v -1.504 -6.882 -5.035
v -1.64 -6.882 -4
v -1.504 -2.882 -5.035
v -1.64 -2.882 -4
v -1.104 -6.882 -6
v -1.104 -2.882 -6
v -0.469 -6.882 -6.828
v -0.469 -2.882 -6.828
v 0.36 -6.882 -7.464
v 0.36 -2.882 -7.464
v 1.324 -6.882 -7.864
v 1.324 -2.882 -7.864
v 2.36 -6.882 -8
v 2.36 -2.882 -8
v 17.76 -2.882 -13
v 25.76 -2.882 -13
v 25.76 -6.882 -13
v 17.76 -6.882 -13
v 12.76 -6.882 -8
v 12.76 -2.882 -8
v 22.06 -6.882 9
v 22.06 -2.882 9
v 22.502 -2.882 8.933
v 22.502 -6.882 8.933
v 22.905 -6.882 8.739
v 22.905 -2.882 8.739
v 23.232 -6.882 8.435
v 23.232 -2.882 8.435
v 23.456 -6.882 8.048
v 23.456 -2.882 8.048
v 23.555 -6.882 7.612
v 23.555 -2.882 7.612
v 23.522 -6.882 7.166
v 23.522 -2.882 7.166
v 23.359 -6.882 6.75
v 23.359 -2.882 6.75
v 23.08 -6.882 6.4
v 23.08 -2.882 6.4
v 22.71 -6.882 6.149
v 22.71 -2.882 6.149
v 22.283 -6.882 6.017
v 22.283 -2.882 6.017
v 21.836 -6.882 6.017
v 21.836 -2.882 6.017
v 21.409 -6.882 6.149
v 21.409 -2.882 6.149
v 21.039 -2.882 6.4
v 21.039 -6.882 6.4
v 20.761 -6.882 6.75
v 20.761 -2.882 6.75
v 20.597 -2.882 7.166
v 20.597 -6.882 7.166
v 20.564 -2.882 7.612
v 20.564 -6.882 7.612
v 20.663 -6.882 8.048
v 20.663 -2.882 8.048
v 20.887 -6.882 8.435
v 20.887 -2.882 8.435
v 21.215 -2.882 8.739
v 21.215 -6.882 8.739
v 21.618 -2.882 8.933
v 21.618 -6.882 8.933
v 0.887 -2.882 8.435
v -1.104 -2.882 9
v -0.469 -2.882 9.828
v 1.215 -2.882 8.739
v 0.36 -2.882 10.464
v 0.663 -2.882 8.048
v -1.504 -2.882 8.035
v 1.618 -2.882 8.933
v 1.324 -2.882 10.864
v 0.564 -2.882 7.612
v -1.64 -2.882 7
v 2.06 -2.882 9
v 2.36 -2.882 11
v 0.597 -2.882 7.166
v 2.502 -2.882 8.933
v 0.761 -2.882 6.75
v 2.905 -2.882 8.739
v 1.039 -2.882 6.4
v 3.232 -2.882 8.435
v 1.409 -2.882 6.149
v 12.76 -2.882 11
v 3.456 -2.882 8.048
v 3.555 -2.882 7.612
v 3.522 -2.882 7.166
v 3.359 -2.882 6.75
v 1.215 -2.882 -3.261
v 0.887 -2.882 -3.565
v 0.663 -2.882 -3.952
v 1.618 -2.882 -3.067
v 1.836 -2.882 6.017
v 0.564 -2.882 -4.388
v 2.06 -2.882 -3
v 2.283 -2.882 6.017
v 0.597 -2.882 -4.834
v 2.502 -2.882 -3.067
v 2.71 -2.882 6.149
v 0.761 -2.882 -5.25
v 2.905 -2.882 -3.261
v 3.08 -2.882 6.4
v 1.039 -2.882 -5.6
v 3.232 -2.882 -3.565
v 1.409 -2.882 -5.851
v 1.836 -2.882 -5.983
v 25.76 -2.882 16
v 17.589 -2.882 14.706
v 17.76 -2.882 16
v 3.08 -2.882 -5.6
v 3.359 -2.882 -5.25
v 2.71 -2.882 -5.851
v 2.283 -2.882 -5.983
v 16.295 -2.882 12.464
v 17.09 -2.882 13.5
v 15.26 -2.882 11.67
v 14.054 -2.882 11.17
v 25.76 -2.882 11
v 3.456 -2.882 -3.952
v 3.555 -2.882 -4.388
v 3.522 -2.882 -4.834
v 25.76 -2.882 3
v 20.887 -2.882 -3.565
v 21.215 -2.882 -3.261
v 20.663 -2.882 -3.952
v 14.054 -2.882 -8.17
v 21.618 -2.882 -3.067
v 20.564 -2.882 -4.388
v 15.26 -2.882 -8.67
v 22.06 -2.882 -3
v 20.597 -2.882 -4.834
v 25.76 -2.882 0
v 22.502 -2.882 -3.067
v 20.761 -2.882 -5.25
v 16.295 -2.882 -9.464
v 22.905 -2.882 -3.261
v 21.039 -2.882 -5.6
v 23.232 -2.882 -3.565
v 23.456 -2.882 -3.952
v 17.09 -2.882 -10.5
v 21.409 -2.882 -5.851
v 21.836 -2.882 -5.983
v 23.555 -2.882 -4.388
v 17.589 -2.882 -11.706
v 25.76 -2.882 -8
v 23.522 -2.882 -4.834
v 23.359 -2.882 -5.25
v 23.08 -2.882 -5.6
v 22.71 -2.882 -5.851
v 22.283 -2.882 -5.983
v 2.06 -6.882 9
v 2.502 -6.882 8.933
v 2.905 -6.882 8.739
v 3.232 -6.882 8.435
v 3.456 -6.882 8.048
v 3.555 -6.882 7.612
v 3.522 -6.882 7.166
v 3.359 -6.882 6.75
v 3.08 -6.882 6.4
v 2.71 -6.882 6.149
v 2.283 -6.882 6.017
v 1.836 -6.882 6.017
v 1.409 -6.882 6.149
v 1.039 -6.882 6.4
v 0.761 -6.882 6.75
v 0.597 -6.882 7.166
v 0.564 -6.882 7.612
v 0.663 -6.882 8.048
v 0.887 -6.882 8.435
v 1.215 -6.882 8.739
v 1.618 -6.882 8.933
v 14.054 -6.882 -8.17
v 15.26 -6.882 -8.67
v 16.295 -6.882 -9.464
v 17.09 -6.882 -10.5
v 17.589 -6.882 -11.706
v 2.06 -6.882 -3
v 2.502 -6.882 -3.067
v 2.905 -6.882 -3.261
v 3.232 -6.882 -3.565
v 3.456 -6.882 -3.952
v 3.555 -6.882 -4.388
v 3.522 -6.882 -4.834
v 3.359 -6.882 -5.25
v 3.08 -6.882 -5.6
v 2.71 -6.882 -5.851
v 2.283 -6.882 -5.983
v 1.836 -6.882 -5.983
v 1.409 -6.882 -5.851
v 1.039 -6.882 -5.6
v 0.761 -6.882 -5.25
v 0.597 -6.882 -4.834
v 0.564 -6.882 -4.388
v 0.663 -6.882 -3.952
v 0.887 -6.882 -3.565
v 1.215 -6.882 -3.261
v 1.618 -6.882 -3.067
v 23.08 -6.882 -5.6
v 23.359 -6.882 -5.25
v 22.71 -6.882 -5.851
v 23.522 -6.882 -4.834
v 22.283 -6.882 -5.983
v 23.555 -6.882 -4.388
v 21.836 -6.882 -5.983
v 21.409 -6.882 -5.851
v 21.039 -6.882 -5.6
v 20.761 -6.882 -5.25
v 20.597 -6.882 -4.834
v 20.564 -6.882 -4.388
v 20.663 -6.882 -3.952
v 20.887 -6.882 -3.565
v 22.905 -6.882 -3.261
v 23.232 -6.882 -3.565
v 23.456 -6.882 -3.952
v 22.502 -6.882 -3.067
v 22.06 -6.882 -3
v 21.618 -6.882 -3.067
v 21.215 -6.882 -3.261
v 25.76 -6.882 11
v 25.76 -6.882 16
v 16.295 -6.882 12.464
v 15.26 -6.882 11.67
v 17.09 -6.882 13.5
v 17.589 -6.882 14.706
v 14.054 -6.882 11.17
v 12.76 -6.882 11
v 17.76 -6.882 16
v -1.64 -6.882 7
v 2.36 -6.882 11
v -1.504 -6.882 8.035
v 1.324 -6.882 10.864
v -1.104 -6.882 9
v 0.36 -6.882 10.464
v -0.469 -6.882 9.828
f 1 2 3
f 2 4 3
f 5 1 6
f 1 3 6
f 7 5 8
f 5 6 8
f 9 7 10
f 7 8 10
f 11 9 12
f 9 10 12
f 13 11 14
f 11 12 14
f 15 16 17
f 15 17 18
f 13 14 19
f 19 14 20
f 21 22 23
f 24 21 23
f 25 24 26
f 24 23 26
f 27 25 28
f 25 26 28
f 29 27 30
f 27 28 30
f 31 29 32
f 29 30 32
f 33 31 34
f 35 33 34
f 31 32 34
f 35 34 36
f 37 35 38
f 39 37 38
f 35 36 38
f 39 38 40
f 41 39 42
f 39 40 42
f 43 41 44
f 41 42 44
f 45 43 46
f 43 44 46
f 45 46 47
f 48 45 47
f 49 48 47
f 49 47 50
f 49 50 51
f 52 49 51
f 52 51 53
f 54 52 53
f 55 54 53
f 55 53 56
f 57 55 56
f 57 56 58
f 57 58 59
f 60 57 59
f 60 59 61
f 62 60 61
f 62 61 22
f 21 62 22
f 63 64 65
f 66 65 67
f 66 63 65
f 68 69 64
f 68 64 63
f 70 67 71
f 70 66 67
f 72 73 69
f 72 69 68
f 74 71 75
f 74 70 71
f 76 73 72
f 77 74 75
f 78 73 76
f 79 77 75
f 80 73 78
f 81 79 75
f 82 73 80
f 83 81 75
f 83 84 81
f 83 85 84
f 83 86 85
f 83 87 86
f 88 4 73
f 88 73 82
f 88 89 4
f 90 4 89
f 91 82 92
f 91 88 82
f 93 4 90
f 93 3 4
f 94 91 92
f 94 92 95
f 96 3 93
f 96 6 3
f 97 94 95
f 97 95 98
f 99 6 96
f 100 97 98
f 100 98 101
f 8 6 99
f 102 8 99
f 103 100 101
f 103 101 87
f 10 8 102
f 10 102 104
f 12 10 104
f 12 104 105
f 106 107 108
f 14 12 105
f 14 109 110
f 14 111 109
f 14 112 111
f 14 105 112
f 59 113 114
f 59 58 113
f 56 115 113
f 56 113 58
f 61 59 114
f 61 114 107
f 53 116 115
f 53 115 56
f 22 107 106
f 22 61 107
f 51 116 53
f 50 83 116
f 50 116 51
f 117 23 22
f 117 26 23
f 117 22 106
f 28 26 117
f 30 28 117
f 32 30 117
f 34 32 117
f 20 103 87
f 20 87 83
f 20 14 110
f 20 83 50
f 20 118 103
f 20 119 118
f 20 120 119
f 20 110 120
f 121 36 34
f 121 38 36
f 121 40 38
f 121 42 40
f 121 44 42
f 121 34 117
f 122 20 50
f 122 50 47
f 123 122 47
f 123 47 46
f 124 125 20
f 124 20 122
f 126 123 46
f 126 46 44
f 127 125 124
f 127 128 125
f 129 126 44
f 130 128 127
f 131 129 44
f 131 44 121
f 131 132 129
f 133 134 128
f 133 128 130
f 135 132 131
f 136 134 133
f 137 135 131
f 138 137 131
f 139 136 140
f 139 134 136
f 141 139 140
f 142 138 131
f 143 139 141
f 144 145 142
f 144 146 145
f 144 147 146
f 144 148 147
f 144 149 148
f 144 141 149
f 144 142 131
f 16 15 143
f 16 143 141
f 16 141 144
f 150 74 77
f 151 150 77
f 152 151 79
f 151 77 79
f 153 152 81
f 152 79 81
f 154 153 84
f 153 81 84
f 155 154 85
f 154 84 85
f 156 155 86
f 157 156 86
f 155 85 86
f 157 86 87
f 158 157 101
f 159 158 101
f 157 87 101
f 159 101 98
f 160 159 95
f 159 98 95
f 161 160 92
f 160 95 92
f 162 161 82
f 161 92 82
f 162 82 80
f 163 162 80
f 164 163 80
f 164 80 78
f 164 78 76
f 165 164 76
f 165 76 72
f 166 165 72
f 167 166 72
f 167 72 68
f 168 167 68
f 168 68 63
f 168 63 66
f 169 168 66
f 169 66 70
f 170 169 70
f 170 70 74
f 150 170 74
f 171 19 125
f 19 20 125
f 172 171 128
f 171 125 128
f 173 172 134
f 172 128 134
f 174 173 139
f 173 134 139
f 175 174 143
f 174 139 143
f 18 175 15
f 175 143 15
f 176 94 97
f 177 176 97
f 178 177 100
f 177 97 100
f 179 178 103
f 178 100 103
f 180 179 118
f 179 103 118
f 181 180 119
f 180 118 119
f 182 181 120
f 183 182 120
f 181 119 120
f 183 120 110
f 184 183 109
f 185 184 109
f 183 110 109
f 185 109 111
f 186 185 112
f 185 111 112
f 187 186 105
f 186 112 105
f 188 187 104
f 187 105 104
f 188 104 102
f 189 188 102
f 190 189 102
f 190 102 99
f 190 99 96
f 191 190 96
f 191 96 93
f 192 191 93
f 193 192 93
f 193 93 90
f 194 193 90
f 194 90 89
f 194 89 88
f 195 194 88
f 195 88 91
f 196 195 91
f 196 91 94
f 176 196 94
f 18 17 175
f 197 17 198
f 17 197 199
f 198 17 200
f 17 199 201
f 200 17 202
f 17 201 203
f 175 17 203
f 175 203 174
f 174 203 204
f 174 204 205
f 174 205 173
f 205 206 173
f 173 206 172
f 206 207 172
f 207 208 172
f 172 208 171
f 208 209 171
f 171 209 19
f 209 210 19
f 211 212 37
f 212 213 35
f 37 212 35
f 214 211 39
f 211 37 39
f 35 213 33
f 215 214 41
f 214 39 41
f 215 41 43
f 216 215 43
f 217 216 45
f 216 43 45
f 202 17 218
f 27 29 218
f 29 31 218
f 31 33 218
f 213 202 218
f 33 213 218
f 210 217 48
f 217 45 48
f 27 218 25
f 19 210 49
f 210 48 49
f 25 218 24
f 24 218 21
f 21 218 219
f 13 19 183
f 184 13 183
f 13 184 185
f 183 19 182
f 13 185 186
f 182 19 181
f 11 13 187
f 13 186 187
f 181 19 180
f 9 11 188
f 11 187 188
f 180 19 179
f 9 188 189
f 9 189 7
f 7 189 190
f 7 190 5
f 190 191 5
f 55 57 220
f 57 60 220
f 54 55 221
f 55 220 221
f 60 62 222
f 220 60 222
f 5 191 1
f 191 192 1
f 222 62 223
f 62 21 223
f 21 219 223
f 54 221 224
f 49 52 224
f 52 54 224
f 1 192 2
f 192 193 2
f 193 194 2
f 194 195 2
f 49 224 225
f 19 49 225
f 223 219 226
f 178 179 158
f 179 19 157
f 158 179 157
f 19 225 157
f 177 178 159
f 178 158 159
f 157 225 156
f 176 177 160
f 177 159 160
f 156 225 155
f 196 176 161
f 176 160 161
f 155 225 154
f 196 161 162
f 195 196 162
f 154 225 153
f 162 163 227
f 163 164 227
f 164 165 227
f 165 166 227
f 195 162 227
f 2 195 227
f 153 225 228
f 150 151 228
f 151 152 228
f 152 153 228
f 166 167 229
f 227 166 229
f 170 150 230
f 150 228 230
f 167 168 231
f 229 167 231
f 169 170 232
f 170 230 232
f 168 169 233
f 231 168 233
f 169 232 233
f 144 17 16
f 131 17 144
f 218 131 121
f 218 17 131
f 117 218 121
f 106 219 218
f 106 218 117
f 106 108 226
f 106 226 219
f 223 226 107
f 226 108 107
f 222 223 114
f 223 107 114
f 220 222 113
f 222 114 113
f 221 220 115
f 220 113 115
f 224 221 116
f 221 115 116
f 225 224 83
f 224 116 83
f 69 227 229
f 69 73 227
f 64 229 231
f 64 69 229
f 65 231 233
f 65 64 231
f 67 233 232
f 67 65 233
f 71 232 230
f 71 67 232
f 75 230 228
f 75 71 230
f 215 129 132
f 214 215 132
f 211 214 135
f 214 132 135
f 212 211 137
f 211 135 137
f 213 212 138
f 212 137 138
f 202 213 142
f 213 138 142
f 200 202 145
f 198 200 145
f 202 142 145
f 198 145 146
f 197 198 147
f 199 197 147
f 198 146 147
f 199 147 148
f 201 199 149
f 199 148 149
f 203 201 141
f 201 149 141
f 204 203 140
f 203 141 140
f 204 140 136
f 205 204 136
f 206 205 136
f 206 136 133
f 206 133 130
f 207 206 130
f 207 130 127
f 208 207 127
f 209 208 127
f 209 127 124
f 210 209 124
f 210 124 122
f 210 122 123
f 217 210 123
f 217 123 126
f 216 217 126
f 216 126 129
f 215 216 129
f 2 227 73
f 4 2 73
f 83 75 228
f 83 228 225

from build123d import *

# Parameters (mm, degrees)
SKETCH_1_W          = 27.399999997
SKETCH_1_H          = 4
EXTRUDE_1_DEPTH     = 3
SKETCH_1_3_W        = 27.399999997
SKETCH_1_3_H        = 4
EXTRUDE_2_DEPTH     = 11
SKETCH_1_4_W        = 27.399999997
SKETCH_1_4_H        = 4
EXTRUDE_3_DEPTH     = 8
SKETCH_2_R          = 1.5
CUT_EXTRUDE_1_DEPTH = 6.5
FILLET_1_R          = 4
EXTRUDE_4_DEPTH     = 19
SKETCH_6_W          = 32.257266432
SKETCH_6_H          = 23.708854684
CUT_EXTRUDE_2_DEPTH = 21
SKETCH_7_W          = 8
SKETCH_7_H          = 4
EXTRUDE_5_DEPTH     = 5
SKETCH_8_W          = 8
SKETCH_8_H          = 4
EXTRUDE_6_DEPTH     = 5
SKETCH_9_W          = 47.208598766
SKETCH_9_H          = 30.653056474
CUT_EXTRUDE_3_DEPTH = 18
FILLET_2_R          = 5


with BuildPart() as part:
    # 草图1 → 凸台-拉伸1 (new body)
    with BuildSketch(Plane.XY):
        with BuildLine():
            ThreePointArc((-0.337371922, -1.853501365), (-0.488220409, -1.87454383), (-0.640366957, -1.881577989))
            Line((-0.640366957, -1.881577989), (-1.640366957, -1.881577989))
            Line((-1.640366957, -1.881577989), (-1.640366957, -2.881577989))
            Line((-1.640366957, -2.881577989), (25.75963304, -2.881577989))
            Line((25.75963304, -2.881577989), (25.75963304, -1.88157799))
            Line((25.75963304, -1.88157799), (24.75963304, -1.88157799))
            ThreePointArc((24.75963304, -1.88157799), (24.607486492, -1.87454383), (24.456638005, -1.853501365))
            ThreePointArc((24.456638005, -1.853501365), (23.608703525, -1.413476758), (23.147062635, -0.577114262))
            ThreePointArc((23.147062635, -0.577114262), (22.880535784, 0.365382964), (22.493851477, 1.265278974))
            ThreePointArc((22.493851477, 1.265278974), (21.584633042, 1.287629087), (20.675414607, 1.265278974))
            ThreePointArc((20.675414607, 1.265278974), (20.288730299, 0.365382964), (20.022203448, -0.577114261))
            ThreePointArc((20.022203448, -0.577114261), (19.560562558, -1.413476758), (18.712628078, -1.853501365))
            ThreePointArc((18.712628078, -1.853501365), (18.409633042, -1.88157799), (18.106638005, -1.853501365))
            ThreePointArc((18.106638005, -1.853501365), (17.258703525, -1.413476758), (16.797062635, -0.577114262))
            ThreePointArc((16.797062635, -0.577114262), (16.530535784, 0.365382964), (16.143851477, 1.265278974))
            ThreePointArc((16.143851477, 1.265278974), (15.234633042, 1.287629087), (14.325414607, 1.265278974))
            ThreePointArc((14.325414607, 1.265278974), (13.938730299, 0.365382964), (13.672203448, -0.577114261))
            ThreePointArc((13.672203448, -0.577114261), (13.210562558, -1.413476758), (12.362628078, -1.853501365))
            ThreePointArc((12.362628078, -1.853501365), (12.059633042, -1.88157799), (11.756638005, -1.853501365))
            ThreePointArc((11.756638005, -1.853501365), (10.908703525, -1.413476758), (10.447062635, -0.577114262))
            ThreePointArc((10.447062635, -0.577114262), (10.180535784, 0.365382964), (9.793851477, 1.265278974))
            ThreePointArc((9.793851477, 1.265278974), (8.884633042, 1.287629087), (7.975414607, 1.265278974))
            ThreePointArc((7.975414607, 1.265278974), (7.588730299, 0.365382964), (7.322203448, -0.577114261))
            ThreePointArc((7.322203448, -0.577114261), (6.860562558, -1.413476758), (6.012628078, -1.853501365))
            ThreePointArc((6.012628078, -1.853501365), (5.709633042, -1.88157799), (5.406638005, -1.853501365))
            ThreePointArc((5.406638005, -1.853501365), (4.558703525, -1.413476758), (4.097062635, -0.577114262))
            ThreePointArc((4.097062635, -0.577114262), (3.830535784, 0.365382964), (3.443851477, 1.265278974))
            ThreePointArc((3.443851477, 1.265278974), (2.534633042, 1.287629087), (1.625414607, 1.265278974))
            ThreePointArc((1.625414607, 1.265278974), (1.238730299, 0.365382964), (0.972203448, -0.577114261))
            ThreePointArc((0.972203448, -0.577114261), (0.510562558, -1.413476758), (-0.337371922, -1.853501365))
        make_face()
        with Locations((12.059633041, -4.881577989)):
            Rectangle(SKETCH_1_W, SKETCH_1_H)
    extrude(amount=EXTRUDE_1_DEPTH)

    # 草图1<3> → 凸台-拉伸2 (add)
    with BuildSketch(Plane.XY):
        with Locations((12.059633041, -4.881577989)):
            Rectangle(SKETCH_1_3_W, SKETCH_1_3_H)
    extrude(amount=EXTRUDE_2_DEPTH)

    # 草图1<4> → 凸台-拉伸3 (add)
    with BuildSketch(Plane.XY):
        with Locations((12.059633041, -4.881577989)):
            Rectangle(SKETCH_1_4_W, SKETCH_1_4_H)
    extrude(amount=-EXTRUDE_3_DEPTH)

    # 草图2 → 切除-拉伸1 (cut)
    with BuildSketch(Plane(origin=(0, -2.881577989, 0), x_dir=(1, 0, 0), z_dir=(0, 1, 0))):
        with Locations(Location((2.059633042, 4.5, 0), (0, 0, 270))):
            Circle(SKETCH_2_R)
        with Locations(Location((22.059633042, 4.5, 0), (0, 0, 270))):
            Circle(SKETCH_2_R)
        with Locations(Location((22.059633042, -7.5, 0), (0, 0, 270))):
            Circle(SKETCH_2_R)
        with Locations(Location((2.059633042, -7.5, 0), (0, 0, 270))):
            Circle(SKETCH_2_R)
    extrude(amount=-CUT_EXTRUDE_1_DEPTH, mode=Mode.SUBTRACT)

    # 圆角1
    fillet_1_edges = [part.edges().sort_by_distance(p)[0] for p in [
        (-1.640366957, -4.881577989, 11),
        (-1.640366957, -4.881577989, -8),
    ]]
    fillet(fillet_1_edges, radius=FILLET_1_R)

    # 草图4 → 凸台-拉伸4 (add)
    with BuildSketch(Plane(origin=(0, 0, -8), x_dir=(-1, 0, 0), z_dir=(0, 0, -1))):
        with BuildLine():
            Line((-11.559633042, -6.881577989), (-16.559633042, -6.881577989))
            Line((-16.559633042, -6.881577989), (-16.559633042, -12.881577989))
            ThreePointArc((-16.559633042, -12.881577989), (-11.842889335, -20.796987993), (-2.636585146, -20.415740147))
            Line((-2.636585146, -20.415740147), (-2.636585146, -19.612245623))
            ThreePointArc((-2.636585146, -19.612245623), (-8.775001634, -18.470018526), (-11.559633042, -12.881577989))
            Line((-11.559633042, -12.881577989), (-11.559633042, -6.881577989))
        make_face()
    extrude(amount=-EXTRUDE_4_DEPTH)

    # 草图6 → 切除-拉伸2 (cut)
    with BuildSketch(Plane.XZ.offset(6.881577989)):
        with Locations((13.405653676, 0.508195322)):
            Rectangle(SKETCH_6_W, SKETCH_6_H)
    extrude(amount=CUT_EXTRUDE_2_DEPTH, mode=Mode.SUBTRACT)

    # 草图7 → 凸台-拉伸5 (add)
    with BuildSketch(Plane.XY.offset(11)):
        with Locations((21.75963304, -4.881577989)):
            Rectangle(SKETCH_7_W, SKETCH_7_H)
    extrude(amount=EXTRUDE_5_DEPTH)

    # 草图8 → 凸台-拉伸6 (add)
    with BuildSketch(Plane(origin=(0, 0, -8), x_dir=(-1, 0, 0), z_dir=(0, 0, -1))):
        with Locations((-21.75963304, -4.881577989)):
            Rectangle(SKETCH_8_W, SKETCH_8_H)
    extrude(amount=EXTRUDE_6_DEPTH)

    # 草图9 → 切除-拉伸3 (cut)
    with BuildSketch(Plane(origin=(0, -2.881577989, 0), x_dir=(1, 0, 0), z_dir=(0, 1, 0))):
        with Locations((10.799915409, -0.879700666)):
            Rectangle(SKETCH_9_W, SKETCH_9_H)
    extrude(amount=CUT_EXTRUDE_3_DEPTH, mode=Mode.SUBTRACT)

    # 圆角2
    fillet_2_edges = [part.edges().sort_by_distance(p)[0] for p in [
        (17.75963304, -4.881577989, 11),
        (17.75963304, -4.881577989, -8),
    ]]
    fillet(fillet_2_edges, radius=FILLET_2_R - 0.0001)  # a hair under: the kernel refuses the full size


solid = part.part
